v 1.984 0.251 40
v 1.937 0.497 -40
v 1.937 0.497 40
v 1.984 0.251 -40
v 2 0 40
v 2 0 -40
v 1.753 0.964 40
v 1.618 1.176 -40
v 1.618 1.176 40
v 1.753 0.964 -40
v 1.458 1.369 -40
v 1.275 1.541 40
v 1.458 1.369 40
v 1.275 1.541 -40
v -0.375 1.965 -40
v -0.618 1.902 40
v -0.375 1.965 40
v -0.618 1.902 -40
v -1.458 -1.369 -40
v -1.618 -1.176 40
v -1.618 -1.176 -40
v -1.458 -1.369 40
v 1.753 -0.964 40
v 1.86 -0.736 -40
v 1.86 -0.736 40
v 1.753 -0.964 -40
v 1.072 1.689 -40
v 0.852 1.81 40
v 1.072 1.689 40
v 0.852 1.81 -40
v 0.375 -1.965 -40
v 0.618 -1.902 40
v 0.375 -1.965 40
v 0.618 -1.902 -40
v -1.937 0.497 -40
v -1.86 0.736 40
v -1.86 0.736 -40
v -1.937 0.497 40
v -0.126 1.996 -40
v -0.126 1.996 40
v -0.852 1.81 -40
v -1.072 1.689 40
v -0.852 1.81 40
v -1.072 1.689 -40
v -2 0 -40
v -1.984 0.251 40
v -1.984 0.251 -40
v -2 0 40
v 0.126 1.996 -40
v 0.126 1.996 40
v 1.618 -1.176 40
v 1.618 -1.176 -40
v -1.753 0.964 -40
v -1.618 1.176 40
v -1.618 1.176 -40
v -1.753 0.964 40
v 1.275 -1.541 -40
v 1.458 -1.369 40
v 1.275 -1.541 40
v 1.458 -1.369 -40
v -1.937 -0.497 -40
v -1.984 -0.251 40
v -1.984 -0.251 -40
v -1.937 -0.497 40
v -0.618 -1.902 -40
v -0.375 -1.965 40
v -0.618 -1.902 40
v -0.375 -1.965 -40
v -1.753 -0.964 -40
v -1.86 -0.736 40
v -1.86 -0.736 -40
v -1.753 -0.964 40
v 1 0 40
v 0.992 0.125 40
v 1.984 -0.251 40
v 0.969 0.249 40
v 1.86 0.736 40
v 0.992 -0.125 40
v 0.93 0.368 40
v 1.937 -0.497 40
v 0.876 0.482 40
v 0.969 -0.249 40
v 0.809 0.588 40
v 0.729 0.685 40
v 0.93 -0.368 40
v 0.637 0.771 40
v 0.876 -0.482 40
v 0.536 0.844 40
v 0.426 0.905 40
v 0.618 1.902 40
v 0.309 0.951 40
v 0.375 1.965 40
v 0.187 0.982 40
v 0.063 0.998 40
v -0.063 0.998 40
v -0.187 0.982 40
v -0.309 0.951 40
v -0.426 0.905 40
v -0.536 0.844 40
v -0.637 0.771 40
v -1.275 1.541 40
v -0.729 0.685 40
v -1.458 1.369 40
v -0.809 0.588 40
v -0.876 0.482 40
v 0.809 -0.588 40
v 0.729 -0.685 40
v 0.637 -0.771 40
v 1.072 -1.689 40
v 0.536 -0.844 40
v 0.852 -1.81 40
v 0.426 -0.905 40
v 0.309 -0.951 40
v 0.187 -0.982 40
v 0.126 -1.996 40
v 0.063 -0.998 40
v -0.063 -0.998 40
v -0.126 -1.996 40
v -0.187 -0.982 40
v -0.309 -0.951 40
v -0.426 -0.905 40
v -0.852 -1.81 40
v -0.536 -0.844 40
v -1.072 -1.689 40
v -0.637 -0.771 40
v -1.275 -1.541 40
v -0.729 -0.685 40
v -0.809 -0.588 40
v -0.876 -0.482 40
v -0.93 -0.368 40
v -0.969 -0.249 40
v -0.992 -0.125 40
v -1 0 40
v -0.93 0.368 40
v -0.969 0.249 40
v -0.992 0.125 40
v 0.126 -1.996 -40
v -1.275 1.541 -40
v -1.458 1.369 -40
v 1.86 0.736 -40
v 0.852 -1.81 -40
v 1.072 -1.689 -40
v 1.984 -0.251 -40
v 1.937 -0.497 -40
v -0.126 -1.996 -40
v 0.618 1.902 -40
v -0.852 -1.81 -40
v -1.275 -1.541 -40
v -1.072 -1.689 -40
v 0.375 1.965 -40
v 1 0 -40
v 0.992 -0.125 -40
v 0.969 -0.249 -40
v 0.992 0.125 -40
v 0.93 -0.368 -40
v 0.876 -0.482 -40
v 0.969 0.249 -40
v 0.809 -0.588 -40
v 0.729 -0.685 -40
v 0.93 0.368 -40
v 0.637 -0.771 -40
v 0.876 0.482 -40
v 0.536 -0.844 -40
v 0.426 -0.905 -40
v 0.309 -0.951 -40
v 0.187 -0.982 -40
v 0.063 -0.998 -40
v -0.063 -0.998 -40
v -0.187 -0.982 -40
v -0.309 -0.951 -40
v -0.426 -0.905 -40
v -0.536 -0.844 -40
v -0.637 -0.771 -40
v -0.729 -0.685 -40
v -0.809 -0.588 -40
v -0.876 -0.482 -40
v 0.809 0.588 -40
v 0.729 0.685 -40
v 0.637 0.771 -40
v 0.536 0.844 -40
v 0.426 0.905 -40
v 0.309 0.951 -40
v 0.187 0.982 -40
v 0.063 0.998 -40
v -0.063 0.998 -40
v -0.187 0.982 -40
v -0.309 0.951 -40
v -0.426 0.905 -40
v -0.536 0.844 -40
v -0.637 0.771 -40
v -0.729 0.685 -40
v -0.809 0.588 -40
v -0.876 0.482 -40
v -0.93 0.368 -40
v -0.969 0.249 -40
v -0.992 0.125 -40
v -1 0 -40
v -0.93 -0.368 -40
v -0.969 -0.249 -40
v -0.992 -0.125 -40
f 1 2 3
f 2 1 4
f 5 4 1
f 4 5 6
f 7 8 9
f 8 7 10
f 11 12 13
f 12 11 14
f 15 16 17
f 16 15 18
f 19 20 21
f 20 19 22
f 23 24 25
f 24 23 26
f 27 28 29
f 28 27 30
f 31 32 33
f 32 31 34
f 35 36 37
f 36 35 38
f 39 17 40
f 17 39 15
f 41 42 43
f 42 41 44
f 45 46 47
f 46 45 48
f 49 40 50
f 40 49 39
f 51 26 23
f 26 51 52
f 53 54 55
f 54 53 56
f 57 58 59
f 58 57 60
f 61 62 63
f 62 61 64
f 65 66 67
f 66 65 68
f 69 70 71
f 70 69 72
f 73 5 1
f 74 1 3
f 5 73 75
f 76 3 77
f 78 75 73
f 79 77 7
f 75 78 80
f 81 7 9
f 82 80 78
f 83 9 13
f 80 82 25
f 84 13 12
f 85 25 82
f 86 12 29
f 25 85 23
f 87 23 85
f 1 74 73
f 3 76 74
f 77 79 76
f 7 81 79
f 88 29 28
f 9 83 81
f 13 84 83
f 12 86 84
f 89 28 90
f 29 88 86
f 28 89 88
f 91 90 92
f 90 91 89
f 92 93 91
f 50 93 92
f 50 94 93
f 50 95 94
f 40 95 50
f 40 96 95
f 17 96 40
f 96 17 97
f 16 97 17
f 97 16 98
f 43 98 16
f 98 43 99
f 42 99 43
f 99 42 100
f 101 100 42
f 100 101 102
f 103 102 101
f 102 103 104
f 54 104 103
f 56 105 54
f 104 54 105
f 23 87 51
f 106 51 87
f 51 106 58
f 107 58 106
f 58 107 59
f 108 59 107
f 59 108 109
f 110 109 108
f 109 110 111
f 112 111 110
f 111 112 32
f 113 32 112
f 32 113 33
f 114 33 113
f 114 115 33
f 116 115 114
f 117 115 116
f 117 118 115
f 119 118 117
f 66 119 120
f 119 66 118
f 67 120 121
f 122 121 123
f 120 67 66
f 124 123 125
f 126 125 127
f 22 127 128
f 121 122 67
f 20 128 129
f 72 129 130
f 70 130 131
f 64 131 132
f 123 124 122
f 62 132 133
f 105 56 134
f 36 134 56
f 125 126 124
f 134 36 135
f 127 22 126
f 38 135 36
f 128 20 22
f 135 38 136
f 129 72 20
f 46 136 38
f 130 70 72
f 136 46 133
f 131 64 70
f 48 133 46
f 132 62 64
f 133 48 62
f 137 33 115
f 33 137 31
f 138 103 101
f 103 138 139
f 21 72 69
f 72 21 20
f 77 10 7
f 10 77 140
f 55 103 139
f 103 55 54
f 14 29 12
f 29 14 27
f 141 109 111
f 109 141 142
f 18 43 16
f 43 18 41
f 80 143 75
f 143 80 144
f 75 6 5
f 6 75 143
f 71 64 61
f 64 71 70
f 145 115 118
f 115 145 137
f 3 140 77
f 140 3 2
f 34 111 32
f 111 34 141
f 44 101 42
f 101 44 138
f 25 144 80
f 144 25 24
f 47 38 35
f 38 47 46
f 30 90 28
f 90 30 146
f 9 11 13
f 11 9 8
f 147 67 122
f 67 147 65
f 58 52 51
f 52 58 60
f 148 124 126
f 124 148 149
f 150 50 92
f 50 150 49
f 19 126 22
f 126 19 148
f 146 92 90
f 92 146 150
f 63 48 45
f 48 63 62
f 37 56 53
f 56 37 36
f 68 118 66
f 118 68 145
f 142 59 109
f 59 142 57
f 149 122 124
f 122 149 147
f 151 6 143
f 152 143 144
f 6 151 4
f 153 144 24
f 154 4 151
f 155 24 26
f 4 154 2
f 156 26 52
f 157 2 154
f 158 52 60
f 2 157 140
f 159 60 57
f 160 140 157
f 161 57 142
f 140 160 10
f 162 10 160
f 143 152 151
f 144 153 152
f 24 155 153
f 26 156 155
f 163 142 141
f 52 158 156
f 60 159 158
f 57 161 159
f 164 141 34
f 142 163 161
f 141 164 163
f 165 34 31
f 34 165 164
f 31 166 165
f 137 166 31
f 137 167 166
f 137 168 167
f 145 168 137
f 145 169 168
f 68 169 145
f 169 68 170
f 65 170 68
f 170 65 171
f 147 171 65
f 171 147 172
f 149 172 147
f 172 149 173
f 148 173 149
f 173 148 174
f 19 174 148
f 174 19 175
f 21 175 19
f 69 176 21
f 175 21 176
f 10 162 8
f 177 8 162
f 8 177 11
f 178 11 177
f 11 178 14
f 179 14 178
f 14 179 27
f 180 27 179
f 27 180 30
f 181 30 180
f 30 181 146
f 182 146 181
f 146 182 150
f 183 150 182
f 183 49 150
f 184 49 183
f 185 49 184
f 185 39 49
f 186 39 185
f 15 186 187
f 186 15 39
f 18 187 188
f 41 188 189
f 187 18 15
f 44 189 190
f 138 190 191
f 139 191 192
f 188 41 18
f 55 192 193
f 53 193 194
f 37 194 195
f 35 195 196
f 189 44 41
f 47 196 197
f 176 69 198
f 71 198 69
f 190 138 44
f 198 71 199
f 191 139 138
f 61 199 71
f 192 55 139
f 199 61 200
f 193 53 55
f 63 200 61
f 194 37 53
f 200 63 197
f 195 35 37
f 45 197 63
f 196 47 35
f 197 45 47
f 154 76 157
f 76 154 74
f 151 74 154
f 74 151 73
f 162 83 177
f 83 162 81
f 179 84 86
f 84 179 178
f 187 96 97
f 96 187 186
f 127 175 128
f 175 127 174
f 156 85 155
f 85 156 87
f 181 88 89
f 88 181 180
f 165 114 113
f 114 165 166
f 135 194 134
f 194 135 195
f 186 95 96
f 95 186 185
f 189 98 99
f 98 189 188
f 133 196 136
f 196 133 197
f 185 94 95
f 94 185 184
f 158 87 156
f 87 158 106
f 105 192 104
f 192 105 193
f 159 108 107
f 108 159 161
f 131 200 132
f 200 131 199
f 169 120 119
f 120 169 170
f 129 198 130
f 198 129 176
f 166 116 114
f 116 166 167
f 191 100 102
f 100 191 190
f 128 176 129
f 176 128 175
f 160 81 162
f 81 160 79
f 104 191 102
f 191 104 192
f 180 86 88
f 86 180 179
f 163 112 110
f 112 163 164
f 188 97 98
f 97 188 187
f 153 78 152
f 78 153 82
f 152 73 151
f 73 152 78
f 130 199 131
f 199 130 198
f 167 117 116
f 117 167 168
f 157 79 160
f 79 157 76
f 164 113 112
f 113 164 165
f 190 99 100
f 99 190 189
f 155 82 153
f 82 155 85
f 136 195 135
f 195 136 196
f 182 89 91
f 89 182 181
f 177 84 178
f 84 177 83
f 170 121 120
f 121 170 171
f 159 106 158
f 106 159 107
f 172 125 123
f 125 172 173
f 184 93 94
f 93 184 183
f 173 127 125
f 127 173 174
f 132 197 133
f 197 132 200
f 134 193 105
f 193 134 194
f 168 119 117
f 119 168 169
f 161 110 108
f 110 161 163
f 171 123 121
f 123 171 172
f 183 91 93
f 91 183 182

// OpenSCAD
$fn = 50;


difference() {
	union() {
		translate(v = [0, 0, -40.0000000000]) {
			cylinder(h = 80, r = 2.0000000000);
		}
	}
	union() {
		translate(v = [0, 0, -100.0000000000]) {
			cylinder(h = 200, r = 1.0000000000);
		}
	}
}
